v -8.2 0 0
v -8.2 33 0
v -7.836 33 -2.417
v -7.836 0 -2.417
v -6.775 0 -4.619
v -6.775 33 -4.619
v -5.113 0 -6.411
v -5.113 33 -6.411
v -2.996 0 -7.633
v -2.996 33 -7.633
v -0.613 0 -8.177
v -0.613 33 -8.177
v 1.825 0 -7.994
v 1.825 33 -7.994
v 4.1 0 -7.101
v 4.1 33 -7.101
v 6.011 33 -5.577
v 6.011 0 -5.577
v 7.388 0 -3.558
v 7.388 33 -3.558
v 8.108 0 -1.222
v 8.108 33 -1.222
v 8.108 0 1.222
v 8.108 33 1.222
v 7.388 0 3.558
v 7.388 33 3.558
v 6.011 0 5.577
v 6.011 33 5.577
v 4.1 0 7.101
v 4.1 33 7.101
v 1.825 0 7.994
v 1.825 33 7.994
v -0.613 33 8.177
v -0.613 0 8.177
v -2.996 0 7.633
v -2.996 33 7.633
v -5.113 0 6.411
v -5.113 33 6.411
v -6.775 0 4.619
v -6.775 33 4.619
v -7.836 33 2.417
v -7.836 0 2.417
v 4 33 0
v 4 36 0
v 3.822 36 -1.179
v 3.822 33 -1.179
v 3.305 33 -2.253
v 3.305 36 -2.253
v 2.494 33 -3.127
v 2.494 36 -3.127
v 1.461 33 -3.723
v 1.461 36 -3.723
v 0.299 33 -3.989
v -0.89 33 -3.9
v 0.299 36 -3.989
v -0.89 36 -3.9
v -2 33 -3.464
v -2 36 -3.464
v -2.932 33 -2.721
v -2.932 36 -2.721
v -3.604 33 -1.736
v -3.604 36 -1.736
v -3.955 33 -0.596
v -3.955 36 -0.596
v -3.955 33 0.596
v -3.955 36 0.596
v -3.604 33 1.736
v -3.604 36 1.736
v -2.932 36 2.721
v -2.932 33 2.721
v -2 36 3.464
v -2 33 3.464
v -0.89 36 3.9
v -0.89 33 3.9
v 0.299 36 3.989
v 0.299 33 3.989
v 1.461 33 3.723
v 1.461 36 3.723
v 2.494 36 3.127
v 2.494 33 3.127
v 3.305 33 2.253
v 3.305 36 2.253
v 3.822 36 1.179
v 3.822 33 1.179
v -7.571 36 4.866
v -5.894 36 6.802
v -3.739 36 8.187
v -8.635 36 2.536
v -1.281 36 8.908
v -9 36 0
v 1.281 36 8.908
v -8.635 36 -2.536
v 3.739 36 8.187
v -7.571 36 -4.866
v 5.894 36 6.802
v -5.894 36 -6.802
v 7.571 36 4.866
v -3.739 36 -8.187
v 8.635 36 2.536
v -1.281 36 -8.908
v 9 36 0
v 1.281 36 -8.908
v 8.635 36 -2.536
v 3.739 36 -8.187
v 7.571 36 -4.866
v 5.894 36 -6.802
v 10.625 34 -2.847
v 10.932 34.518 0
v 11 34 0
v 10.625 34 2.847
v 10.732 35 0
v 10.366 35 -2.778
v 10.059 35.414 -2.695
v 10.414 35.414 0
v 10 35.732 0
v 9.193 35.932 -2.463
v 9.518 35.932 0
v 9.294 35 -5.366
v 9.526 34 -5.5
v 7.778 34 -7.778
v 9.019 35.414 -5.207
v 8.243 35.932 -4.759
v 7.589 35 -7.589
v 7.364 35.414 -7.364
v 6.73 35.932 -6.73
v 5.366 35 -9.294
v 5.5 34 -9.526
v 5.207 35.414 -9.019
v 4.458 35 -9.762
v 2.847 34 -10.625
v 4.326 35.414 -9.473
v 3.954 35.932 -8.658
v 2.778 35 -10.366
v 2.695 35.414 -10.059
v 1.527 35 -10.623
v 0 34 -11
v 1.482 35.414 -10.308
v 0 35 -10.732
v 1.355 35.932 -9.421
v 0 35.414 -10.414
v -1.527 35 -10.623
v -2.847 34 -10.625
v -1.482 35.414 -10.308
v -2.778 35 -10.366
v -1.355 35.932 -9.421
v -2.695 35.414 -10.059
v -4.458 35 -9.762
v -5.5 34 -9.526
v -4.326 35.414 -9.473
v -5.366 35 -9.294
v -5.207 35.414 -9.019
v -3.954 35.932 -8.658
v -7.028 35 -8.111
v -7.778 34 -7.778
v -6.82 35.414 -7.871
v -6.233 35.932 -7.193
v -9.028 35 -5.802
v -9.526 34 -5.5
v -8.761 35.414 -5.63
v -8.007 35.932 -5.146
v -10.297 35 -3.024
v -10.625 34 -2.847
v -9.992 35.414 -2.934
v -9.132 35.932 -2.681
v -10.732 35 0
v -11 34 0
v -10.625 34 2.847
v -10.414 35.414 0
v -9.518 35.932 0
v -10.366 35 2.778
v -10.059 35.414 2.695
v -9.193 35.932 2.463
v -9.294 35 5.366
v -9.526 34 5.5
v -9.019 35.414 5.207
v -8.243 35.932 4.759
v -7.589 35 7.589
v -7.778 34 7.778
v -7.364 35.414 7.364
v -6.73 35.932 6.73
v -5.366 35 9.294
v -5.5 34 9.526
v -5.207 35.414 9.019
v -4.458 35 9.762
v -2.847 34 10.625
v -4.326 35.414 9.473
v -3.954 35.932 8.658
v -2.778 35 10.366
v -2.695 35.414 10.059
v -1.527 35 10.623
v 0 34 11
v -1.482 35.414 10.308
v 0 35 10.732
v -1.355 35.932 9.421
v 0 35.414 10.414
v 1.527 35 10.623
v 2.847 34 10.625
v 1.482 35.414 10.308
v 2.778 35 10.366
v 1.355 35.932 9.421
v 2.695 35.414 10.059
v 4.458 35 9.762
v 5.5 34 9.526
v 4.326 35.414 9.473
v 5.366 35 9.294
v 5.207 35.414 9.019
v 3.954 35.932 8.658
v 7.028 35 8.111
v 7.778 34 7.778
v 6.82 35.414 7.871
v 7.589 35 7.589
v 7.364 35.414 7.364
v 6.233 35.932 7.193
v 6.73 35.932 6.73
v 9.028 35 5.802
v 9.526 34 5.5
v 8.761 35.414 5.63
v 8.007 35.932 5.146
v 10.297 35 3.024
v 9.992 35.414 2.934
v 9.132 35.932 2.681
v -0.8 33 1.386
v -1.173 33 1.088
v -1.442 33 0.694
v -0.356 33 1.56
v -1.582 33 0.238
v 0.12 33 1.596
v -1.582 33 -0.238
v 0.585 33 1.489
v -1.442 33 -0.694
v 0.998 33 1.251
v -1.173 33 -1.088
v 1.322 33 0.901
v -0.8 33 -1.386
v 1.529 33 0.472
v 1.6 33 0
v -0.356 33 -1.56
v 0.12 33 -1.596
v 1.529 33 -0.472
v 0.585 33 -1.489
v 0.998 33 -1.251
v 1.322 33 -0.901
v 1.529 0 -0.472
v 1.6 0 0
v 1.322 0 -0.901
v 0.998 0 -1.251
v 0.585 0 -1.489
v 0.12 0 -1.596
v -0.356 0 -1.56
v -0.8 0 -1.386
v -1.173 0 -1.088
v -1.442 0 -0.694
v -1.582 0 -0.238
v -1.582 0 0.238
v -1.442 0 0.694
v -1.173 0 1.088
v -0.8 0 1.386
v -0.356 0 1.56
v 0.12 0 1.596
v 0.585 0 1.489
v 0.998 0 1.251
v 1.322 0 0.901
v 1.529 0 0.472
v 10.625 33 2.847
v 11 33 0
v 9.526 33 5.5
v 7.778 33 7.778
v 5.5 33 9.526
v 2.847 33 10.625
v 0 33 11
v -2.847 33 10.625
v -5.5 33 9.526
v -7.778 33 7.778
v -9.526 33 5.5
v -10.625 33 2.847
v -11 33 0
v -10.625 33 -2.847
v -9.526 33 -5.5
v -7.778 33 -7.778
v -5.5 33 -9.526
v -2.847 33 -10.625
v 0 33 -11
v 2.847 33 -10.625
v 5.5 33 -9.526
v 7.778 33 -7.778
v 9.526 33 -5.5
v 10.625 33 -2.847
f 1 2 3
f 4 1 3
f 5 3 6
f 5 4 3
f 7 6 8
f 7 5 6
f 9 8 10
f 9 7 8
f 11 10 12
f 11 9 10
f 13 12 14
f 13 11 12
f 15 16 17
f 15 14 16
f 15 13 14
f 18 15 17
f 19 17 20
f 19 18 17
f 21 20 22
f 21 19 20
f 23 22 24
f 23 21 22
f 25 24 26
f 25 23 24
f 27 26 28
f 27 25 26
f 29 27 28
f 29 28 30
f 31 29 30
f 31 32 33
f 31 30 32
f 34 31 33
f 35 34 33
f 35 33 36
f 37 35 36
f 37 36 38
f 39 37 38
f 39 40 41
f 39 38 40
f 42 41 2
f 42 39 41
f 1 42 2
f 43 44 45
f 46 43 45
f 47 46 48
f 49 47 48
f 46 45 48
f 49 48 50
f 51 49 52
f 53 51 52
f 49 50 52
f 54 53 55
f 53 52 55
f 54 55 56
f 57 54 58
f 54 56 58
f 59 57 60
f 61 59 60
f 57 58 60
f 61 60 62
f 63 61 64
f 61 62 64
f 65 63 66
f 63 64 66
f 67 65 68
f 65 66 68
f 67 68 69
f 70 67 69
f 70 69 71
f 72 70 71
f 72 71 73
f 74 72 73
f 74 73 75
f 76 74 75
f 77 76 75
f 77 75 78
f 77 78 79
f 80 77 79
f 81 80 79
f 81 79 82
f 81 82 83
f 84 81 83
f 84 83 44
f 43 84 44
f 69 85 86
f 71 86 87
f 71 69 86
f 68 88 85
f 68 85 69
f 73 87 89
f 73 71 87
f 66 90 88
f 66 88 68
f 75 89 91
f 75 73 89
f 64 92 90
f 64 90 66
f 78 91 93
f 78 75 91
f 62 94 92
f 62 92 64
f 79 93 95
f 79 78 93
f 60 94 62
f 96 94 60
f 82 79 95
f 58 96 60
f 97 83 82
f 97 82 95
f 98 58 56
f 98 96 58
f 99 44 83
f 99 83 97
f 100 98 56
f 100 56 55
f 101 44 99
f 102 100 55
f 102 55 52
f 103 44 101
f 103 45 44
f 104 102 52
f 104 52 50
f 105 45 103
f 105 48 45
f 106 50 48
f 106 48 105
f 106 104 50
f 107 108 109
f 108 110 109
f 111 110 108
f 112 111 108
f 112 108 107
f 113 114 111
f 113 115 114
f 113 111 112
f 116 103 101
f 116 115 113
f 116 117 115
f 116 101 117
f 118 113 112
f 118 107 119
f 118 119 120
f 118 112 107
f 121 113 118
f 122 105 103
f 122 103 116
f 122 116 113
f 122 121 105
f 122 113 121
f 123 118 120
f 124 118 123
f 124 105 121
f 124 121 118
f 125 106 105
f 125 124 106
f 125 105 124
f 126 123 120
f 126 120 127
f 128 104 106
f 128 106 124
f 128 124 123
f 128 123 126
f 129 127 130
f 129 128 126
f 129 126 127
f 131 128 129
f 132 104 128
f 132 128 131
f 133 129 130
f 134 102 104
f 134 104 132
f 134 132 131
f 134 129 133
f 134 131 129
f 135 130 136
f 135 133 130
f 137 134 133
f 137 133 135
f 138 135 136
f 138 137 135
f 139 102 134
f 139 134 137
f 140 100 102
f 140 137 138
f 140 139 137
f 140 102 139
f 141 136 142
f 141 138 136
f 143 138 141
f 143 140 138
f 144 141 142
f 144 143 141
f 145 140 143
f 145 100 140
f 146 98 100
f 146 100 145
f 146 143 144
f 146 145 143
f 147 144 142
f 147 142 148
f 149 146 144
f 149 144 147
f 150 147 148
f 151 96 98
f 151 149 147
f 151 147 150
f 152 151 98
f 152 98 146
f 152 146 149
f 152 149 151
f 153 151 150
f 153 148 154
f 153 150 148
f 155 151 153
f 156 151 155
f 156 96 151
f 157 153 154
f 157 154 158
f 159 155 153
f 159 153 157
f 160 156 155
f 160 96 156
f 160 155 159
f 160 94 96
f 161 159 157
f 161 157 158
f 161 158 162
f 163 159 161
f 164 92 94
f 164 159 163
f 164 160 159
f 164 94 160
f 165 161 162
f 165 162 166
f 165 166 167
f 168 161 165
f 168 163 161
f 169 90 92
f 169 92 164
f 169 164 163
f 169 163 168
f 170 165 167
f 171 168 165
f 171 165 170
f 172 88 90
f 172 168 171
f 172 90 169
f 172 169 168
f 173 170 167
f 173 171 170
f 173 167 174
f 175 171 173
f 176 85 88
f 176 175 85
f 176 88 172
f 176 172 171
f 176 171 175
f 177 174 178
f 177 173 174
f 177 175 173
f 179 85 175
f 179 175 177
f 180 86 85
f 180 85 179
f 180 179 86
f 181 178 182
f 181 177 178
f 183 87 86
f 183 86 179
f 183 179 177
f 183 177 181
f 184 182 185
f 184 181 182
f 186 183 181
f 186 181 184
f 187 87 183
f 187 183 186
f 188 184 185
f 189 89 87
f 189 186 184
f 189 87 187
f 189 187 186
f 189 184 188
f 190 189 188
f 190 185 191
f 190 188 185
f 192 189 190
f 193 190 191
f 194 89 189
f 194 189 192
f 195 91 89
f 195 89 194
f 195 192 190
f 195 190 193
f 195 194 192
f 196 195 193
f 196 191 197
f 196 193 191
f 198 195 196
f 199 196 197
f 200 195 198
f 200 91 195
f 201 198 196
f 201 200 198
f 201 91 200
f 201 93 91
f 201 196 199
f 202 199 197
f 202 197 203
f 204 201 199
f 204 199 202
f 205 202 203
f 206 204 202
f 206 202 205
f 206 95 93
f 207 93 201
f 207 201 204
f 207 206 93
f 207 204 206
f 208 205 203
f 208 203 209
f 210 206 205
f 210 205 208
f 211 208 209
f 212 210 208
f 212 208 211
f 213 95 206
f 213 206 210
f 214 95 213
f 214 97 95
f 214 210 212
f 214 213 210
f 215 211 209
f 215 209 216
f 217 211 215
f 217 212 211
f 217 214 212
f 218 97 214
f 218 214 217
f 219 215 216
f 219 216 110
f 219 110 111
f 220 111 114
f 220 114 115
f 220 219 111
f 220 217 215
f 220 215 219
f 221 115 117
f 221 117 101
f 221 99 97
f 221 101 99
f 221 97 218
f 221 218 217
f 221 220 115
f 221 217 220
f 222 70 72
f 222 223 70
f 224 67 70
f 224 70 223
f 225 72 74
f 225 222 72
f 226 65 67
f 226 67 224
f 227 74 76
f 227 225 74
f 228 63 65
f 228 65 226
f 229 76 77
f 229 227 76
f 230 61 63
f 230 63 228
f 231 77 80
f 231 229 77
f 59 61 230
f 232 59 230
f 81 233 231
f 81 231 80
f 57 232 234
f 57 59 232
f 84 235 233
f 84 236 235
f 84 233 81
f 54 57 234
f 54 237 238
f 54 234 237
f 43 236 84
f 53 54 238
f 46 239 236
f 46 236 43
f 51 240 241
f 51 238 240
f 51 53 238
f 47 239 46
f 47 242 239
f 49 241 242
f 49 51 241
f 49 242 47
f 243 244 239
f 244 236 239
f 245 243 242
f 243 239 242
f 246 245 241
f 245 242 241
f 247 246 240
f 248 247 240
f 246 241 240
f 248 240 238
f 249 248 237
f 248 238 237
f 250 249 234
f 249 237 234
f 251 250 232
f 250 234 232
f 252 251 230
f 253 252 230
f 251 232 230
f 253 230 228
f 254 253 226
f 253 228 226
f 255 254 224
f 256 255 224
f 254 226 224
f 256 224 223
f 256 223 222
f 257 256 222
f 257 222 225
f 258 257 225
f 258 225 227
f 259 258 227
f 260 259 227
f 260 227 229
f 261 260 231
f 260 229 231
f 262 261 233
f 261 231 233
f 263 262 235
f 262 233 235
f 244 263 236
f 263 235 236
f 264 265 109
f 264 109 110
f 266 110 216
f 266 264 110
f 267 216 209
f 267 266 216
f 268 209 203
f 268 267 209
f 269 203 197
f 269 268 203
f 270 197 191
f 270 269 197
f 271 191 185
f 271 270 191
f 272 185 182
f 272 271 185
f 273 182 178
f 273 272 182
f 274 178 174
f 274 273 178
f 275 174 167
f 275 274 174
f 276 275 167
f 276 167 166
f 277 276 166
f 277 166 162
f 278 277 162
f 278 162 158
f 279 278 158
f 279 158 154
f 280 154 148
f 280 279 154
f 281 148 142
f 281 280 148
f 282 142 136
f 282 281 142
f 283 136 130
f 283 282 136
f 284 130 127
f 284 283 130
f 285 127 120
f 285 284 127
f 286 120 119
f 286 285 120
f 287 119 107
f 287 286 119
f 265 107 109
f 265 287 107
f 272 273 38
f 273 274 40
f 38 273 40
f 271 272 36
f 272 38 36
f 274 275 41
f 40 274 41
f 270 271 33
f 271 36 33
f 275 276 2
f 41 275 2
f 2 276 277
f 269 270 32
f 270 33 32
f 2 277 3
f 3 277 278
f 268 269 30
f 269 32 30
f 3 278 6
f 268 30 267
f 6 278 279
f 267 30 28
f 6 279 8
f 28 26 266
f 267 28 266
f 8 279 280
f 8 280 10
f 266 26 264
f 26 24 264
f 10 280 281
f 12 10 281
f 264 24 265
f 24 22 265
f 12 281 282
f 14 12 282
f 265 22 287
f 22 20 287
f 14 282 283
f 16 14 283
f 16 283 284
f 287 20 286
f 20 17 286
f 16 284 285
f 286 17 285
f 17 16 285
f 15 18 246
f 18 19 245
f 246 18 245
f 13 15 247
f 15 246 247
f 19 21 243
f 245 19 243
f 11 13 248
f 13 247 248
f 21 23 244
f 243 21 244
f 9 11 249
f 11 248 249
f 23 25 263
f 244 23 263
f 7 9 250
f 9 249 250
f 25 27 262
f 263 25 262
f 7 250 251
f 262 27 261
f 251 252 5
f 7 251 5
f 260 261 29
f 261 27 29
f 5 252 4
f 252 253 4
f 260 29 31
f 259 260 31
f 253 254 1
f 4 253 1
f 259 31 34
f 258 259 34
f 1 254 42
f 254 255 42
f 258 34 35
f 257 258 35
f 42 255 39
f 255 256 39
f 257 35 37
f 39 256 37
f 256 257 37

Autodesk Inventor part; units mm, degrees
ref_plane "YZ Plane" through (0, 0, 0) normal (1, 0, 0) x (0, 1, 0)
ref_plane "XZ Plane" through (0, 0, 0) normal (0, 1, 0) x (-1, 0, 0)
ref_plane "XY Plane" through (0, 0, 0) normal (0, 0, 1) x (1, 0, 0)
sketch "Sketch1" plane through (0, 0, 0) normal (0, 1, 0) x (-1, 0, 0)
  circle A0 centre (0, 0) radius 8.2
  dimension "d0" = 16.4
extrude "Extrusion1" add sketch "Sketch1" along normal blind 33
sketch "Sketch3" plane through (0, 33, 0) normal (0, 1, 0) x (1, 0, 0)
  circle A0 centre (0, 0) radius 11
  dimension "d4" = 22
extrude "Extrusion2" add sketch "Sketch3" along normal blind 3
sketch "Sketch4" plane through (0, 36, 0) normal (0, 1, 0) x (1, 0, 0)
  circle A0 centre (0, 0) radius 1.6
  dimension "d7" = 3.2
extrude "Extrusion3" cut sketch "Sketch4" against normal blind 100
sketch "Sketch5" plane through (0, 36, 0) normal (0, 1, 0) x (1, 0, 0)
  circle A0 centre (0, 0) radius 1.6 projected
  circle A1 centre (0, 0) radius 4
  dimension "d10" = 8
extrude "Extrusion4" cut sketch "Sketch5" against normal blind 3
fillet "Fillet1" radius 2 1 edges at (-11, 36, 0)
properties part number "Foam_wing_mount_bolt"
